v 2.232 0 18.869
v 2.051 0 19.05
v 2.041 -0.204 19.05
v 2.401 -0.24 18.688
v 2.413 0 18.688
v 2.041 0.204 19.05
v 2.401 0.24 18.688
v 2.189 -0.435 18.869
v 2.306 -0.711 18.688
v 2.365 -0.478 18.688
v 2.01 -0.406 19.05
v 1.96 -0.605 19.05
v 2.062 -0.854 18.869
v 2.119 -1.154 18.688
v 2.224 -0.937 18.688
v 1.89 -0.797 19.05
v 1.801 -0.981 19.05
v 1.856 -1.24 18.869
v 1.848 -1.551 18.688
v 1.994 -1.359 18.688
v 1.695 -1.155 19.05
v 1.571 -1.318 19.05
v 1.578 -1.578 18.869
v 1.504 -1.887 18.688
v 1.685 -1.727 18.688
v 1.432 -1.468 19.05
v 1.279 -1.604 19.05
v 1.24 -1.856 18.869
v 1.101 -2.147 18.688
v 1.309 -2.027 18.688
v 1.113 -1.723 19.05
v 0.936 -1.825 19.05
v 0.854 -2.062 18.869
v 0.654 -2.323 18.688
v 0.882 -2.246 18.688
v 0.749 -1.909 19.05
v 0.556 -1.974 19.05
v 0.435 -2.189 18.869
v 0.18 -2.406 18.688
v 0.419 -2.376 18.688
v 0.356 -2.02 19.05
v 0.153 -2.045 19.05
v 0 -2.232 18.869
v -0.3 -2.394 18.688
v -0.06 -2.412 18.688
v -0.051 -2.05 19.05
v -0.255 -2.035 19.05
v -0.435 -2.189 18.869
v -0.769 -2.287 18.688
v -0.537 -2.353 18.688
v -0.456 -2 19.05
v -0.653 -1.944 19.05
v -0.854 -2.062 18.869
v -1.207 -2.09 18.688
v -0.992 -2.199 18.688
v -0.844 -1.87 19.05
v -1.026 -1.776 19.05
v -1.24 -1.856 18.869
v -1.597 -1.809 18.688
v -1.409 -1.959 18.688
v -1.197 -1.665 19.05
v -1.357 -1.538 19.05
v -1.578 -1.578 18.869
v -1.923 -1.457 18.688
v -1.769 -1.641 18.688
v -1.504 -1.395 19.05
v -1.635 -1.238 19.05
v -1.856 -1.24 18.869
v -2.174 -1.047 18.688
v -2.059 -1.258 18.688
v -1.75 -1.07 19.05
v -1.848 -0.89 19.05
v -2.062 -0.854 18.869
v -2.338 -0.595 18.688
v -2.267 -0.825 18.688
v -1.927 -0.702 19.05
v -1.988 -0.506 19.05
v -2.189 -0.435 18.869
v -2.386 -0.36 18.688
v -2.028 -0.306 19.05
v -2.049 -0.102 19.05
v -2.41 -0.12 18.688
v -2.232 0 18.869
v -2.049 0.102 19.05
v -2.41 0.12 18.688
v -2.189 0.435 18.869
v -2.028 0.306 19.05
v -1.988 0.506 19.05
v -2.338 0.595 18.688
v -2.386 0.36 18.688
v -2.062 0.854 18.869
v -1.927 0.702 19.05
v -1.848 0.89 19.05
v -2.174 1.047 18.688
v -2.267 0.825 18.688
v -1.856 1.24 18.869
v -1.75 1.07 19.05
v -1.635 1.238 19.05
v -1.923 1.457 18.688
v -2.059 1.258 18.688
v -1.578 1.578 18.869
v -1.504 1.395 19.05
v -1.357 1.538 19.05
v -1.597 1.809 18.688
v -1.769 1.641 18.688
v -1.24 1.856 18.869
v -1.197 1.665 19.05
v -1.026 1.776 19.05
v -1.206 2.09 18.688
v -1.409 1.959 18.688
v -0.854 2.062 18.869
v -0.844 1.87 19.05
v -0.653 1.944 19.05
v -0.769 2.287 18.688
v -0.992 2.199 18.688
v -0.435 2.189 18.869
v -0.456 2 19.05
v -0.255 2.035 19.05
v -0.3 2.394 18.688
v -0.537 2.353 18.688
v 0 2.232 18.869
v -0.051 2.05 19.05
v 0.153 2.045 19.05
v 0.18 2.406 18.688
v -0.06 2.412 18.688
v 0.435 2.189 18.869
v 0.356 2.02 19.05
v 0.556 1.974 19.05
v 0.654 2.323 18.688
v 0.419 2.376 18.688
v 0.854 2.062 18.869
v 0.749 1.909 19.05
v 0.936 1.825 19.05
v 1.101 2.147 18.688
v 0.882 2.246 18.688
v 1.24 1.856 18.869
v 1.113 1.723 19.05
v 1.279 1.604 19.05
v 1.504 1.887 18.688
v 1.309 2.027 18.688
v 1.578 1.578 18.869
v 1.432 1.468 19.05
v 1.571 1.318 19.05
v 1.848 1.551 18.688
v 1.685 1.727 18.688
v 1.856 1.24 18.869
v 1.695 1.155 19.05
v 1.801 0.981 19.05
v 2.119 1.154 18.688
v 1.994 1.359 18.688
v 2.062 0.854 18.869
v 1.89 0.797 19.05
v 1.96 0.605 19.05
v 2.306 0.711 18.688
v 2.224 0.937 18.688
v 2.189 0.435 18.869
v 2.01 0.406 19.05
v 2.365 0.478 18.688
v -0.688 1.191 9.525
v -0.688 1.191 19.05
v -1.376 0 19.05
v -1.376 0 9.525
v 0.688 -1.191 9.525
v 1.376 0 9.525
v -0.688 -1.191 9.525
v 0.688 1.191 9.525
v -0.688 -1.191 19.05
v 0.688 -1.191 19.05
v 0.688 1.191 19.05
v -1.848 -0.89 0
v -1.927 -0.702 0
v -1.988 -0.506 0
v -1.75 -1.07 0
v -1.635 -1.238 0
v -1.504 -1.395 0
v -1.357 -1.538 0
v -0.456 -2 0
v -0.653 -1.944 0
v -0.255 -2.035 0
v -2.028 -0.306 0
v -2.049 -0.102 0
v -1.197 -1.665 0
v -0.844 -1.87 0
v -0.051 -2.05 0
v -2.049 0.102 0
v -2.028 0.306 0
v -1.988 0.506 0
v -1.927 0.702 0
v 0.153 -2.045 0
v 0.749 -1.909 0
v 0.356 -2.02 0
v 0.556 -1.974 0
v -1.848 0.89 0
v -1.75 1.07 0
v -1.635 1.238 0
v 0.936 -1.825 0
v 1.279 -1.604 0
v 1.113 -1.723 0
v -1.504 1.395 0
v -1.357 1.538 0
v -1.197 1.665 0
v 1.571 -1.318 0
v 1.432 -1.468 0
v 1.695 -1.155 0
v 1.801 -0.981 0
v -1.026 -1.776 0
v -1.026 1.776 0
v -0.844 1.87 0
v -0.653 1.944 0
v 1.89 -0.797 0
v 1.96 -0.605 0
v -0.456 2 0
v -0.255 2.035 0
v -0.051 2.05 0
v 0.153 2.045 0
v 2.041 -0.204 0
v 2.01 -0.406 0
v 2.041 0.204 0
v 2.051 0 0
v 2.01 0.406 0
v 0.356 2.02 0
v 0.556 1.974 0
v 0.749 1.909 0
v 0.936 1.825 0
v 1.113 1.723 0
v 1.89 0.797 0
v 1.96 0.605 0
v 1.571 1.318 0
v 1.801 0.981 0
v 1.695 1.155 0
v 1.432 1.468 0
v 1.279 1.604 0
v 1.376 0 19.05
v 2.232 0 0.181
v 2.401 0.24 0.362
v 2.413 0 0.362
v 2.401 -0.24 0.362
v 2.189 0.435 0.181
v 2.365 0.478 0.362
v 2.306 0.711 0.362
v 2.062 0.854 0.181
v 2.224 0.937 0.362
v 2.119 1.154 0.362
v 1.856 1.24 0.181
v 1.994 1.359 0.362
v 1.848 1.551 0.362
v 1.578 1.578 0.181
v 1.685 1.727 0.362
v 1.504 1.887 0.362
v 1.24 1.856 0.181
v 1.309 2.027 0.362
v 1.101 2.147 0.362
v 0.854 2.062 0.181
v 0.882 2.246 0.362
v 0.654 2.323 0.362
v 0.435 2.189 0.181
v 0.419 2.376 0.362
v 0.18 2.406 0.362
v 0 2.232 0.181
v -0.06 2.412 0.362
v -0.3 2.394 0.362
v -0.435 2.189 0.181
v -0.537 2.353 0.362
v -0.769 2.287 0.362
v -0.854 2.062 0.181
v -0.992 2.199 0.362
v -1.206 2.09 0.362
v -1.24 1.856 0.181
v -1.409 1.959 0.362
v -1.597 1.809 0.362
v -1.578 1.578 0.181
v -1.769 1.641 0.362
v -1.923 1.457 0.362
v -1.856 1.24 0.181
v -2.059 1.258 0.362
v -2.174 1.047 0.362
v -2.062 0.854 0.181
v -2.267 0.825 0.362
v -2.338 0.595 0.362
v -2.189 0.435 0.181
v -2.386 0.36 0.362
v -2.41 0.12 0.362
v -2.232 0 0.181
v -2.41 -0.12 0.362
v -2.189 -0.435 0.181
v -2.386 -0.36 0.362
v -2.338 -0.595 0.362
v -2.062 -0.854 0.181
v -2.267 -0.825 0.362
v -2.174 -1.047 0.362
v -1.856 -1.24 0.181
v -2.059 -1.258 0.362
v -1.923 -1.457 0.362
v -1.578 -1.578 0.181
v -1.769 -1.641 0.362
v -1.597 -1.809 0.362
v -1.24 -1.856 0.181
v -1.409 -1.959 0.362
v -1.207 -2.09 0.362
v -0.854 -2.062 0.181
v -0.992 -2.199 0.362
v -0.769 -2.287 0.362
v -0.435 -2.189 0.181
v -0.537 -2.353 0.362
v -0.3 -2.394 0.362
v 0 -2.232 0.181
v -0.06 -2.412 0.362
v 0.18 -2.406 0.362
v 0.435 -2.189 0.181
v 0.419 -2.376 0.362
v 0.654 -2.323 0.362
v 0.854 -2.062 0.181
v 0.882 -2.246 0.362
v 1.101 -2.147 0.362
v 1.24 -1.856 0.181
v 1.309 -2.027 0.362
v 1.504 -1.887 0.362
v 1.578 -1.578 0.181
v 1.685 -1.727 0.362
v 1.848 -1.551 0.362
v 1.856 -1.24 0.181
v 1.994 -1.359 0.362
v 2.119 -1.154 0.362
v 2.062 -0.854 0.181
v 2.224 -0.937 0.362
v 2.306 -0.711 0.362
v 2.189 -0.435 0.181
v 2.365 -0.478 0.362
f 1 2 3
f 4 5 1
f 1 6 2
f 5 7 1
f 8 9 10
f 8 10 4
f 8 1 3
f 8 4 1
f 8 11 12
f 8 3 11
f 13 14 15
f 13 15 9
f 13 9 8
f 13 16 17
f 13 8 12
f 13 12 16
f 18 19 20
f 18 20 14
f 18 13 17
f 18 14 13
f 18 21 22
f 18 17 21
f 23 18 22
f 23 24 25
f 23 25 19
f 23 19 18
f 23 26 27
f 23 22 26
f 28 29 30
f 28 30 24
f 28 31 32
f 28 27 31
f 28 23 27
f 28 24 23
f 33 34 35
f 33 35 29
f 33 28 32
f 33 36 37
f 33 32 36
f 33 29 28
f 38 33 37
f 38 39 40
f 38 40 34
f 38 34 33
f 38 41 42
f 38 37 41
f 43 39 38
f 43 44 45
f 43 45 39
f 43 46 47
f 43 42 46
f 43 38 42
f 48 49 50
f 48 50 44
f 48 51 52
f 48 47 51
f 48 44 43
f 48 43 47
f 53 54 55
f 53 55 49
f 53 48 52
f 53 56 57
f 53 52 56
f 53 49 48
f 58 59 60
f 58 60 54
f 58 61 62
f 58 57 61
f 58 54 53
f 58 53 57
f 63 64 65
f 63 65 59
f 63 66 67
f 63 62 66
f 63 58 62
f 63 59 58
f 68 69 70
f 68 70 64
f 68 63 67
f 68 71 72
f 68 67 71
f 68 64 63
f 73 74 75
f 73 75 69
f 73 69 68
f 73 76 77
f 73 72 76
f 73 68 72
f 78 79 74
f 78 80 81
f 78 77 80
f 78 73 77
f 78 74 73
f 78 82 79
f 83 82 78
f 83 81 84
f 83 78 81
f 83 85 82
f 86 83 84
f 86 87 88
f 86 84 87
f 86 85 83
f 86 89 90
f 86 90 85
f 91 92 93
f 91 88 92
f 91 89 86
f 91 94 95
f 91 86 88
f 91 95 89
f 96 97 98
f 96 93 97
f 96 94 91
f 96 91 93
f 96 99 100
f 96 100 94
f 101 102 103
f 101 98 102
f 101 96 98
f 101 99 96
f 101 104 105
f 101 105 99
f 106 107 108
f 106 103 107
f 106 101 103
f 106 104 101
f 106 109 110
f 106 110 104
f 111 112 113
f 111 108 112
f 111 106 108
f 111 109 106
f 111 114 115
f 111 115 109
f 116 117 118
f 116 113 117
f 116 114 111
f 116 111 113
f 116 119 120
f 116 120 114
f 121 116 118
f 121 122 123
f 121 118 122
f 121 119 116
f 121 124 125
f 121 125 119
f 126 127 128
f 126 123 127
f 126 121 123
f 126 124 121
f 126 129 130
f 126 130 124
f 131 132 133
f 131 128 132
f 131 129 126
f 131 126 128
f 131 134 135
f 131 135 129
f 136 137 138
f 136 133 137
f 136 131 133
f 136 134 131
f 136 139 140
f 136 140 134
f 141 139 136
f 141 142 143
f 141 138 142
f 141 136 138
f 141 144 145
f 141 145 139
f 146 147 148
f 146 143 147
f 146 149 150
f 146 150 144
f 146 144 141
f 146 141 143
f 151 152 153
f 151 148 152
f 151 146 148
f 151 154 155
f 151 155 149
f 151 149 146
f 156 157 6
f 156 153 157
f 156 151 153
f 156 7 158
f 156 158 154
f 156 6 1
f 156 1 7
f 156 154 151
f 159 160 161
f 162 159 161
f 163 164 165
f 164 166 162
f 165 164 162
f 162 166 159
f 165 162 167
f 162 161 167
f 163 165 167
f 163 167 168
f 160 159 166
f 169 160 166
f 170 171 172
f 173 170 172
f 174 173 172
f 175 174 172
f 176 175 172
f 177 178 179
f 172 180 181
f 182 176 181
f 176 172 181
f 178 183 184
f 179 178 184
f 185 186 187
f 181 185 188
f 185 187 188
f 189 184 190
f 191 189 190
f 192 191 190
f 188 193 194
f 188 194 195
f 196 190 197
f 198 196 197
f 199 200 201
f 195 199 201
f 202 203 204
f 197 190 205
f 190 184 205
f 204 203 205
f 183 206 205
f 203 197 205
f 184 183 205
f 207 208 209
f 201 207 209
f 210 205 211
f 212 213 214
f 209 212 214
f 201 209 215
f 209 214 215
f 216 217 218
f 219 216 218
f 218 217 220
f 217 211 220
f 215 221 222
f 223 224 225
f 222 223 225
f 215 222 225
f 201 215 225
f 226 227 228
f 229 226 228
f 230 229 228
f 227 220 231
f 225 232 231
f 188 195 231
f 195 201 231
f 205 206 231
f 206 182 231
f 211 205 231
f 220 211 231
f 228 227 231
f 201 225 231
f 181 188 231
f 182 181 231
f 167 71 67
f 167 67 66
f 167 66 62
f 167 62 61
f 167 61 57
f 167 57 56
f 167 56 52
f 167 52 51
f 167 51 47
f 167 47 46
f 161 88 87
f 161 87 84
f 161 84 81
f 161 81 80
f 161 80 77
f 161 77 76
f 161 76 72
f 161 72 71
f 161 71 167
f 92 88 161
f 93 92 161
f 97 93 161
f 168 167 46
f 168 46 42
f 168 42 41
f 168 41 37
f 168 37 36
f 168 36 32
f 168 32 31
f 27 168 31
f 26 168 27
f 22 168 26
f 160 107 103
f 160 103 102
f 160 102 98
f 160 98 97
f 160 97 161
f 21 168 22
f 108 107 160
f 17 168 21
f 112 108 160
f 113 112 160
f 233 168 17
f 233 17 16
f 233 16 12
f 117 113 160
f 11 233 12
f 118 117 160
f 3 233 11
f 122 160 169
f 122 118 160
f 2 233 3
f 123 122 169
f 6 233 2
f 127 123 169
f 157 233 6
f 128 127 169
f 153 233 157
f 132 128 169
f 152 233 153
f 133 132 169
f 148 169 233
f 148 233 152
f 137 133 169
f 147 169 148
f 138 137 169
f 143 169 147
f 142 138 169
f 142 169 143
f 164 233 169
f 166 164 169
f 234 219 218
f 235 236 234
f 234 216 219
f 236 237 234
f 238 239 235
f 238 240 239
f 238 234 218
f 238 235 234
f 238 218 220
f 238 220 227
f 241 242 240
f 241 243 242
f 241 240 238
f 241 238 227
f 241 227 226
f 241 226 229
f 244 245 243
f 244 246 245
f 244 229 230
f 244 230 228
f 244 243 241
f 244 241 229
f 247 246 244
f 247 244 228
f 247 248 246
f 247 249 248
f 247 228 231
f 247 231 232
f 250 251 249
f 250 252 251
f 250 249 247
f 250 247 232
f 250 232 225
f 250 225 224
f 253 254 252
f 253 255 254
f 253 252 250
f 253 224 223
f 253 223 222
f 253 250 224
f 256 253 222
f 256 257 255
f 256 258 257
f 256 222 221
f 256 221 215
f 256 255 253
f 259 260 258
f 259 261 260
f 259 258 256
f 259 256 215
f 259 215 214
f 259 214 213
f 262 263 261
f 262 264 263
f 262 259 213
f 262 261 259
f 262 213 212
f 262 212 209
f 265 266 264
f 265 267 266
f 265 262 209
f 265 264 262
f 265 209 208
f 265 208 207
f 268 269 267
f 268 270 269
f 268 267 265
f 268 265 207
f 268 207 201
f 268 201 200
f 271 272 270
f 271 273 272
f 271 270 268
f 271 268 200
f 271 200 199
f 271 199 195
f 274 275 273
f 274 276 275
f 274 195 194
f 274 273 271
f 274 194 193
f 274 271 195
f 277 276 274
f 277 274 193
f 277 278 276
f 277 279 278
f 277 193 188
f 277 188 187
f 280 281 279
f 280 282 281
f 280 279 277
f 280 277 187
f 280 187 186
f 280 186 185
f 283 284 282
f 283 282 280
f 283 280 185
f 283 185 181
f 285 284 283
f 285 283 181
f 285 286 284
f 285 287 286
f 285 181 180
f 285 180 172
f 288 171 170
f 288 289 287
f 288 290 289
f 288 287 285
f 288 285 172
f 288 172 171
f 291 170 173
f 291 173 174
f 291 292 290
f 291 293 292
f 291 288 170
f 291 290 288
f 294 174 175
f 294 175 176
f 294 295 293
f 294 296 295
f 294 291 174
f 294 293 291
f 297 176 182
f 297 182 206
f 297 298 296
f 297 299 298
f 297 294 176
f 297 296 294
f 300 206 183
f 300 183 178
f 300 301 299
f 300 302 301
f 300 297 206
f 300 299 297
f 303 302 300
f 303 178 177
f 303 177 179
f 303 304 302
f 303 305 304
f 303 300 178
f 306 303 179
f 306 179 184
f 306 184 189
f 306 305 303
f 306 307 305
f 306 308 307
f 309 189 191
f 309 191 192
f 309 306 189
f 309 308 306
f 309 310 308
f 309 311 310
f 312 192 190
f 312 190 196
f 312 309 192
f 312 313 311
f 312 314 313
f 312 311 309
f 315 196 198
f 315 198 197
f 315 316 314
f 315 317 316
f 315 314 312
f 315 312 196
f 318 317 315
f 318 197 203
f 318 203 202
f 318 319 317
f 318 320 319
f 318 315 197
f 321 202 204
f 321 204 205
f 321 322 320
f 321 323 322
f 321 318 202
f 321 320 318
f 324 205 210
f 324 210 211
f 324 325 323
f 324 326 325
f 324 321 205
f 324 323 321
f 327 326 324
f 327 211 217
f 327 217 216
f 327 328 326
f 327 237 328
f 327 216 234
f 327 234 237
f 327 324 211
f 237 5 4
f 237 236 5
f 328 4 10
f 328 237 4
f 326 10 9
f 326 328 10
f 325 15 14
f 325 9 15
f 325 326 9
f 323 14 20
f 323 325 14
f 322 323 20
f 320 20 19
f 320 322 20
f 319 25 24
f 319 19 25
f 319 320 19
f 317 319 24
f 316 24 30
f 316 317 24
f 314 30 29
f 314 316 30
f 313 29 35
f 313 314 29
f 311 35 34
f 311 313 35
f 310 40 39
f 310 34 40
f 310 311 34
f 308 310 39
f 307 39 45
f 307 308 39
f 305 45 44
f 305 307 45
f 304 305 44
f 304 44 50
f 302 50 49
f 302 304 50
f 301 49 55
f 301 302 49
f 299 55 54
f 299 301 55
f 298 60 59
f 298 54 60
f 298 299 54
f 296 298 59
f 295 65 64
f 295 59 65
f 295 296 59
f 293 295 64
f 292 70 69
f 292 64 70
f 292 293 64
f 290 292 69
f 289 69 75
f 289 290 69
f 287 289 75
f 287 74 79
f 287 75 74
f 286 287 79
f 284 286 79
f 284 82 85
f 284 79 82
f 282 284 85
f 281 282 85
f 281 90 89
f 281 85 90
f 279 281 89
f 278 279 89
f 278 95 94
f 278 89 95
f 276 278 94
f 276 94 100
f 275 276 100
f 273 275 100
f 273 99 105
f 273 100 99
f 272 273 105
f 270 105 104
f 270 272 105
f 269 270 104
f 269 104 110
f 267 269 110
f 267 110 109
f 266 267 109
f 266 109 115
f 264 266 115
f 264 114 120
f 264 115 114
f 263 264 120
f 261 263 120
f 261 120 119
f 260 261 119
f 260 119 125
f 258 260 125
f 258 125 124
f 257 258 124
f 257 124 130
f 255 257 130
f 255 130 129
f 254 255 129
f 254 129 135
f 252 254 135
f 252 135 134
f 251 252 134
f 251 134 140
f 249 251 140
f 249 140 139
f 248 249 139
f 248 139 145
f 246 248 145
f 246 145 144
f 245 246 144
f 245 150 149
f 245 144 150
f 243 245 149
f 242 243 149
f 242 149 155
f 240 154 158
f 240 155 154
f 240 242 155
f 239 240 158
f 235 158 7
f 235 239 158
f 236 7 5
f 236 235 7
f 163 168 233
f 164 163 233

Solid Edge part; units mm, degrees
sketch "Sketch1" plane through (0, 0, 0) normal (0, 0, 1) x (1, 0, 0)
  circle A0 centre (0, 0) radius 2.413
  dimension "D1" = 4.826
extrude "Protrusion1" add sketch "Sketch1" along normal blind 19.05
chamfer "Chamfer1" distance 0.3619 angle 45 2 edges at (-2.413, 0, 0) (-2.413, 0, 19.05)
sketch "Sketch2" plane through (0, 0, 19.05) normal (0, 0, 1) x (1, 0, 0)
  line L0 (-0.6878, 1.1913) -> (0.6878, 1.1913)
  line L1 (1.3755, 0) -> (0.6878, 1.1913)
  line L2 (0.6878, -1.1913) -> (1.3755, 0)
  line L3 (-0.6878, -1.1913) -> (0.6878, -1.1913)
  line L4 (-1.3755, 0) -> (-0.6878, -1.1913)
  line L5 (-0.6878, 1.1913) -> (-1.3755, 0)
  dimension "D1" = 2.3825
extrude "Cutout1" cut sketch "Sketch2" against normal blind 9.525
properties part number "24101738"
